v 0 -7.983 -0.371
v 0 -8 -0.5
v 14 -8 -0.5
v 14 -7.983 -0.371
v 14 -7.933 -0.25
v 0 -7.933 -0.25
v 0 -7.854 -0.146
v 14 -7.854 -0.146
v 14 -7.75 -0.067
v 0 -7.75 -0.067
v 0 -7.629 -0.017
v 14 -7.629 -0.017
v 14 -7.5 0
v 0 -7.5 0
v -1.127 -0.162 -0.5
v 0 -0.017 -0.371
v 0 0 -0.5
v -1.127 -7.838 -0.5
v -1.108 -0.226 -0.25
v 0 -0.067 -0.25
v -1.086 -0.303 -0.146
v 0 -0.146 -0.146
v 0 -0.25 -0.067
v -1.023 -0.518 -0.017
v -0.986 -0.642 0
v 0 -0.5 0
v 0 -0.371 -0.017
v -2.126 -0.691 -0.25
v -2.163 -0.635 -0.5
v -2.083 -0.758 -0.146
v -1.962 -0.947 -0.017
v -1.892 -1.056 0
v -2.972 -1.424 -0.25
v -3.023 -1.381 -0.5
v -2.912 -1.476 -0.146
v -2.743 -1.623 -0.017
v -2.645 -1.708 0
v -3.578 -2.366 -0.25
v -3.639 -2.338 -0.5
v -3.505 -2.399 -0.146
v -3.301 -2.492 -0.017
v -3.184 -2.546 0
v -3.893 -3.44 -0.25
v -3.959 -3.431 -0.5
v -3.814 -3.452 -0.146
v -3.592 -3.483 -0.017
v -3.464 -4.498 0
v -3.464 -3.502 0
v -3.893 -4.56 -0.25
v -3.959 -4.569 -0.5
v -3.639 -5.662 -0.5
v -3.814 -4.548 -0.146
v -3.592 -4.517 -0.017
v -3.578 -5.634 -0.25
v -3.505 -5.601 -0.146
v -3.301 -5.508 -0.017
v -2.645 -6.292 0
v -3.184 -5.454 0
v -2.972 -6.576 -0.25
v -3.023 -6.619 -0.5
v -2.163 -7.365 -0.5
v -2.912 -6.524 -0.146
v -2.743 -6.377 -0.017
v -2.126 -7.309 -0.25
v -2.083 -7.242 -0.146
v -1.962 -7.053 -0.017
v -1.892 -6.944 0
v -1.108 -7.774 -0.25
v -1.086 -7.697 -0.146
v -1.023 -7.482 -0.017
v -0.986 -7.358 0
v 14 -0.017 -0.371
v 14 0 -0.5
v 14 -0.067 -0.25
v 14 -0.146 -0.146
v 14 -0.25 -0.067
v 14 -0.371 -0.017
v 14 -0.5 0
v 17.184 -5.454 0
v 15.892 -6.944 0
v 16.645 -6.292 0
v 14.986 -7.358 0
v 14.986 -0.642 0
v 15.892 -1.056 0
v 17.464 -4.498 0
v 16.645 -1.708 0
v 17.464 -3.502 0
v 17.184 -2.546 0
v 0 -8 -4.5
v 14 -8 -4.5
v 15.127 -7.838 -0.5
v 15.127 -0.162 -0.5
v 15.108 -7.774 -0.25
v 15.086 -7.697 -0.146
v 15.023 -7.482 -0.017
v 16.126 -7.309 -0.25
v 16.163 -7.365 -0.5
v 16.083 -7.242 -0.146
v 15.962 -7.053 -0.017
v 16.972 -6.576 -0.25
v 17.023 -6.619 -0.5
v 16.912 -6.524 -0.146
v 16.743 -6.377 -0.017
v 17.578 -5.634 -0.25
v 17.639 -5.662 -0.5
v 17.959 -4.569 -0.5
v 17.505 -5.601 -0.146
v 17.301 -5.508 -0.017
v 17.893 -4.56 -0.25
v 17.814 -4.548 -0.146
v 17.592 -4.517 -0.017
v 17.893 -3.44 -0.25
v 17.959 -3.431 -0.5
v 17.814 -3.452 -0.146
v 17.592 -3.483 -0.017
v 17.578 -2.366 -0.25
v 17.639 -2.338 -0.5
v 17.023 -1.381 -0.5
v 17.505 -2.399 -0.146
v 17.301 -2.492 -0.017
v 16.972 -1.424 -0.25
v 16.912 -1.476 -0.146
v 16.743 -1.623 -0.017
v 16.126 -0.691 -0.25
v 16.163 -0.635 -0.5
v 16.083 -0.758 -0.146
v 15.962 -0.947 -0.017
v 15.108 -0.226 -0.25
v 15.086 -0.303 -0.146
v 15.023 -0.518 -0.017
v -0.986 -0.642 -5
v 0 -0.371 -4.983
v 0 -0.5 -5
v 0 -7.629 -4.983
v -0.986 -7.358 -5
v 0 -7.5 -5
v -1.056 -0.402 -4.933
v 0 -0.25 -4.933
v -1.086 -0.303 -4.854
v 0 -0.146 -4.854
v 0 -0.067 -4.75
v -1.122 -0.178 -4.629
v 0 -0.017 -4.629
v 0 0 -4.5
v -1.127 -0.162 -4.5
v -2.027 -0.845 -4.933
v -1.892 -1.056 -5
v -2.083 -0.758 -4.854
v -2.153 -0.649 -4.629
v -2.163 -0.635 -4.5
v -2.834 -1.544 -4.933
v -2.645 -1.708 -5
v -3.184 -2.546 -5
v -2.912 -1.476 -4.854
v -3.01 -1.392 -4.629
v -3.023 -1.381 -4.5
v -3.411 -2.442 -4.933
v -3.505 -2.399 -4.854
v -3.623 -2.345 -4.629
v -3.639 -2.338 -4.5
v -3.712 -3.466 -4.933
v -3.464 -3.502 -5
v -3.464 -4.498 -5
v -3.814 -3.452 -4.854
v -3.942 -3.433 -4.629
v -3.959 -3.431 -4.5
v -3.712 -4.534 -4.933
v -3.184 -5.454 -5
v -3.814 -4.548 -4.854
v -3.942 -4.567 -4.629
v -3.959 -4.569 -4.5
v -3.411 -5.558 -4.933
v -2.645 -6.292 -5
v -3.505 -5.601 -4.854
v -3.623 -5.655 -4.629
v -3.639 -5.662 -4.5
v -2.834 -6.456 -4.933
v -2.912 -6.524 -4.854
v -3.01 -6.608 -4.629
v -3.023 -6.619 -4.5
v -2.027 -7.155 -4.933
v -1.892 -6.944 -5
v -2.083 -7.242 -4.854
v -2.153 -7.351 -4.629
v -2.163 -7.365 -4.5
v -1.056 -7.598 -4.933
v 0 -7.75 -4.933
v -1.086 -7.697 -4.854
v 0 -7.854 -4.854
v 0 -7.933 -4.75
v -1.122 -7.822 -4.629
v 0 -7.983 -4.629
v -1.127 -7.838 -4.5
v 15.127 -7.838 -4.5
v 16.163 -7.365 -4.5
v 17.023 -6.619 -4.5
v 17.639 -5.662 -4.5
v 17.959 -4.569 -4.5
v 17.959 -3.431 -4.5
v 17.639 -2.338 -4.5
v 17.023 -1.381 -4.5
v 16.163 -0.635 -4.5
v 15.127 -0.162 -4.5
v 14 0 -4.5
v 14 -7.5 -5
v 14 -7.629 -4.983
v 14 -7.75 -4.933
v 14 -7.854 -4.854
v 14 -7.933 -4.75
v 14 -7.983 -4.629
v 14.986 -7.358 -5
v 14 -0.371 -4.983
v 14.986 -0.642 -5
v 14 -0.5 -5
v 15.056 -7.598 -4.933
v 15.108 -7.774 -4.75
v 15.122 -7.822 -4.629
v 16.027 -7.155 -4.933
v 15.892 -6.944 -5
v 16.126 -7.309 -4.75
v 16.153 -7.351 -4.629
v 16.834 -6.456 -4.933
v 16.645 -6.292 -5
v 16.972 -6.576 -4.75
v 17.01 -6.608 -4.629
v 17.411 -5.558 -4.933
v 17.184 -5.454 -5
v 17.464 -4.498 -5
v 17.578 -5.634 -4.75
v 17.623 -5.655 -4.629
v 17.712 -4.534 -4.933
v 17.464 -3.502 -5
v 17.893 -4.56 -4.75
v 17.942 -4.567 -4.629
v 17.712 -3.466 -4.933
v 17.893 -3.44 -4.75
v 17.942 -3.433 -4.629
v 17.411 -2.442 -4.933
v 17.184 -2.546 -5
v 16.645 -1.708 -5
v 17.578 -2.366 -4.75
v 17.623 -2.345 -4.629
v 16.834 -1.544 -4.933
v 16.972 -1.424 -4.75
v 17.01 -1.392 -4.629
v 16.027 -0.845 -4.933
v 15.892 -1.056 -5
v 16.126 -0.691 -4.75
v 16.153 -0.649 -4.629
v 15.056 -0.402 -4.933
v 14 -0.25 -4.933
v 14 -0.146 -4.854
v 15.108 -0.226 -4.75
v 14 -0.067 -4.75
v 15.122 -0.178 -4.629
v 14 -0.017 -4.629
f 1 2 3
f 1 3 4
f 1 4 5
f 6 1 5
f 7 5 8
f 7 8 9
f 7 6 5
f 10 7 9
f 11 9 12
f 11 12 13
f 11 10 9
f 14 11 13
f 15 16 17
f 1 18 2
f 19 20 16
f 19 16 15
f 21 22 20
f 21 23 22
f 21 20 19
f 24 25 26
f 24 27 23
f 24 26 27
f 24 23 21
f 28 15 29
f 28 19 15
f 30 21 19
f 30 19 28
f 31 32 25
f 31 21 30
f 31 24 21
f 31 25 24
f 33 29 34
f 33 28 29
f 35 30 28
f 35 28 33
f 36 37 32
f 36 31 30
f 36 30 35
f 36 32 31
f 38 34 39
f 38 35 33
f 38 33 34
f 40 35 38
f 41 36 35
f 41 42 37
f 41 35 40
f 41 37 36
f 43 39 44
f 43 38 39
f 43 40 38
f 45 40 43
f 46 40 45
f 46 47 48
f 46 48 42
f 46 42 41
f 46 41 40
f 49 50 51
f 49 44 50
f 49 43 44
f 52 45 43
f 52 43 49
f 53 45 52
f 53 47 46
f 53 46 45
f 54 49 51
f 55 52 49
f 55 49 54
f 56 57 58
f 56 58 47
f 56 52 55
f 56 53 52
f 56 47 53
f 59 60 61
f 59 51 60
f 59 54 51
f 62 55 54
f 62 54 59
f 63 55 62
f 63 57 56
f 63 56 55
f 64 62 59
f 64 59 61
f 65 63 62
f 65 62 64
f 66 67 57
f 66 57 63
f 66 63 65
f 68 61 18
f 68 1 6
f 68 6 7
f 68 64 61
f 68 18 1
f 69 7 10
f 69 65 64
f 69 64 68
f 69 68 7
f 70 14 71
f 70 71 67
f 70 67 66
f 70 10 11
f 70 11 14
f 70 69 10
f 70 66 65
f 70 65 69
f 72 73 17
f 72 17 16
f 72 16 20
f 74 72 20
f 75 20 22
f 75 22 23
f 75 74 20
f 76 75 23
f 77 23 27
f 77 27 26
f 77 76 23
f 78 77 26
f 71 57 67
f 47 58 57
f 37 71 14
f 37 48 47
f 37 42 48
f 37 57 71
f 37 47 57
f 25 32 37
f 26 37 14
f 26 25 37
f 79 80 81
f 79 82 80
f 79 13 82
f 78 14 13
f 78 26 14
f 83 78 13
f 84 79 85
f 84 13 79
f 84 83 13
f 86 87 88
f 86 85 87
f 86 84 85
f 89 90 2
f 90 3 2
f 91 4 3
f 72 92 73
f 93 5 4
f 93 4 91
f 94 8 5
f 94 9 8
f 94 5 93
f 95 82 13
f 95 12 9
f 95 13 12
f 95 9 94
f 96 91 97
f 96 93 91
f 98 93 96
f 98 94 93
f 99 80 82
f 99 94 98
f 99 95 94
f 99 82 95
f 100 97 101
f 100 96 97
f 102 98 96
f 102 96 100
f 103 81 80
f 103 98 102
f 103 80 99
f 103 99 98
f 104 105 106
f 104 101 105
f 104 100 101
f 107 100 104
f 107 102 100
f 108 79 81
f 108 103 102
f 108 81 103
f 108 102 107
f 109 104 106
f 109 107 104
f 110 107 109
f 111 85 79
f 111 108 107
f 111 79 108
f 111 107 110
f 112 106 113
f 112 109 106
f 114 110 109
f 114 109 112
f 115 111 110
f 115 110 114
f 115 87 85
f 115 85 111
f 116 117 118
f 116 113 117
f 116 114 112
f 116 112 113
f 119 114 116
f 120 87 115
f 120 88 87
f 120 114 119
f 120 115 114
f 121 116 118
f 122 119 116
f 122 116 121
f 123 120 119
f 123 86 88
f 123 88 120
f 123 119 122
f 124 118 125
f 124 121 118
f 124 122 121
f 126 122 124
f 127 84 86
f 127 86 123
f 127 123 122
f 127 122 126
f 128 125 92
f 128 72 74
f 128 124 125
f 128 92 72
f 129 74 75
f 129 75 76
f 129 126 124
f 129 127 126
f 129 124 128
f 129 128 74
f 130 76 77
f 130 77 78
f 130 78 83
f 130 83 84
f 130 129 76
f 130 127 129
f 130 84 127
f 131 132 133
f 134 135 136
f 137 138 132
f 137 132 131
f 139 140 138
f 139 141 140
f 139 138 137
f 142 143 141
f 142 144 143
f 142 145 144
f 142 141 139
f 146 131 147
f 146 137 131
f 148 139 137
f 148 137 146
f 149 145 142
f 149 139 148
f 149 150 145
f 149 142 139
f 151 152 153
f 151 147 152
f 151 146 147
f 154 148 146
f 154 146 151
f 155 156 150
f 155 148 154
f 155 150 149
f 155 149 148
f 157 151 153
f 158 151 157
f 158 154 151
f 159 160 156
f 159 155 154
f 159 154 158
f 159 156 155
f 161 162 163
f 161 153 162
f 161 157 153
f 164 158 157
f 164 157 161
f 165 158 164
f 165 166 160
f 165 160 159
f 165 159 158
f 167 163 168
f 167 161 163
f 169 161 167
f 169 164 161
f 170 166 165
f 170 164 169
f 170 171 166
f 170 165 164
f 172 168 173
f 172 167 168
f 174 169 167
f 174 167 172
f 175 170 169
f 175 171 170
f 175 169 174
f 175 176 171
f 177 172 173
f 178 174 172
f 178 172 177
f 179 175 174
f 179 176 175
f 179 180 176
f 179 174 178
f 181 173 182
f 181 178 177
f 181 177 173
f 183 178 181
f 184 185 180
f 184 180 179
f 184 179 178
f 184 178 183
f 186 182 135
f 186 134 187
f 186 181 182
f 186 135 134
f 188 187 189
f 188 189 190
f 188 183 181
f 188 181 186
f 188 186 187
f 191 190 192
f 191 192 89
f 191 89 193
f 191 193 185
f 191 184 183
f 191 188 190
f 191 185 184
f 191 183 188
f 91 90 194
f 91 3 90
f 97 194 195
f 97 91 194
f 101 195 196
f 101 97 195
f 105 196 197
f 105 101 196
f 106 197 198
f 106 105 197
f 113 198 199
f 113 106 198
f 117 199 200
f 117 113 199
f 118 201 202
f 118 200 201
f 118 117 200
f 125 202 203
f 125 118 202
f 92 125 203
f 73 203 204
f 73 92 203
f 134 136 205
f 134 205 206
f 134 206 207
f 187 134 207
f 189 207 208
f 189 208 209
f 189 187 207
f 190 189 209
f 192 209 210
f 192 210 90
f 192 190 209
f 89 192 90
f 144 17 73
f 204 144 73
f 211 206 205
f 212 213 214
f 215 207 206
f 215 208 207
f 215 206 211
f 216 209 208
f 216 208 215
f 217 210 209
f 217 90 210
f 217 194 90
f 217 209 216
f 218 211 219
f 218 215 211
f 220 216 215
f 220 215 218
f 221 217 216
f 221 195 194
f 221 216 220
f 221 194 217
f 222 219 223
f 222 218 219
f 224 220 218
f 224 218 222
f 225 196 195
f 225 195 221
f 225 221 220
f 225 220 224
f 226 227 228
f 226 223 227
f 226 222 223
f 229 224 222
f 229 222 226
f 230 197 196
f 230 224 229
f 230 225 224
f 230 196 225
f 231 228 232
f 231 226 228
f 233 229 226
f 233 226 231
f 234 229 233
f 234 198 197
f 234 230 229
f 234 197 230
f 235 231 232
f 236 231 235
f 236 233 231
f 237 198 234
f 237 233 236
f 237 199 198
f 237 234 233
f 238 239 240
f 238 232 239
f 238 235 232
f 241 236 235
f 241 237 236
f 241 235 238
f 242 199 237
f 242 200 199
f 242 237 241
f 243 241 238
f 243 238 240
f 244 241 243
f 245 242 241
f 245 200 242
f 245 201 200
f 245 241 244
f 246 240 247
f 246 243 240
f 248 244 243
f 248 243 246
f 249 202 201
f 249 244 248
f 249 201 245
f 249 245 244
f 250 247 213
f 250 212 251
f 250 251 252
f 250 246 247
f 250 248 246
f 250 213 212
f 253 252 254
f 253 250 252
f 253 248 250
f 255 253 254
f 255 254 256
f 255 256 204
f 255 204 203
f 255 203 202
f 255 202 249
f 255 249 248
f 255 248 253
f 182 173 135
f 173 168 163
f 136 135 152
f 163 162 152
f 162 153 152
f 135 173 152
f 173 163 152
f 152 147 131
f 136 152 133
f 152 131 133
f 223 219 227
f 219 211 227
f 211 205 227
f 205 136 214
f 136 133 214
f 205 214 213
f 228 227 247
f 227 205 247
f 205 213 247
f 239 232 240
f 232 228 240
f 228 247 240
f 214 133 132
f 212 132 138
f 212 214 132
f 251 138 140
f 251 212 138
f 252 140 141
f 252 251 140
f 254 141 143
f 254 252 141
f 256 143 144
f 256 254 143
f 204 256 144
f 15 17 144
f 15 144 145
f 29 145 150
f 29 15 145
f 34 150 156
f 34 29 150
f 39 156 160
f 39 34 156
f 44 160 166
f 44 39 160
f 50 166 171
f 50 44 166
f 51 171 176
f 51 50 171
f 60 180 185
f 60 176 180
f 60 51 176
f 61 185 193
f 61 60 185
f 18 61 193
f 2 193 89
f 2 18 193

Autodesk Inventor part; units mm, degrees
ref_plane "YZ Plane" through (0, 0, 0) normal (1, 0, 0) x (0, 1, 0)
ref_plane "XZ Plane" through (0, 0, 0) normal (0, 1, 0) x (-1, 0, 0)
ref_plane "XY Plane" through (0, 0, 0) normal (0, 0, 1) x (1, 0, 0)
sketch "草图1" plane through (0, 0, 0) normal (0, 0, 1) x (1, 0, 0)
  line L0 (0, 0) -> (14, 0)
  line L1 (14, 0) -> (14, -8)
  line L2 (14, -8) -> (0, -8)
  line L3 (0, -8) -> (0, 0)
  arc A0 (14, -8) -> (14, 0) centre (14, -4) ccw
  arc A1 (0, 0) -> (0, -8) centre (0, -4) ccw
  dimension "d0" = 14
  dimension "d1" = 8
extrude "拉伸1" add sketch "草图1" against normal blind 5
fillet "圆角1" radius 0.5 8 edges at (7, 0, 0) (-4, -4, 0) (7, -8, 0) (18, -4, 0) (7, -8, -5) (-4, -4, -5) (7, 0, -5) (18, -4, -5)
properties part number "装填盘轴键"
